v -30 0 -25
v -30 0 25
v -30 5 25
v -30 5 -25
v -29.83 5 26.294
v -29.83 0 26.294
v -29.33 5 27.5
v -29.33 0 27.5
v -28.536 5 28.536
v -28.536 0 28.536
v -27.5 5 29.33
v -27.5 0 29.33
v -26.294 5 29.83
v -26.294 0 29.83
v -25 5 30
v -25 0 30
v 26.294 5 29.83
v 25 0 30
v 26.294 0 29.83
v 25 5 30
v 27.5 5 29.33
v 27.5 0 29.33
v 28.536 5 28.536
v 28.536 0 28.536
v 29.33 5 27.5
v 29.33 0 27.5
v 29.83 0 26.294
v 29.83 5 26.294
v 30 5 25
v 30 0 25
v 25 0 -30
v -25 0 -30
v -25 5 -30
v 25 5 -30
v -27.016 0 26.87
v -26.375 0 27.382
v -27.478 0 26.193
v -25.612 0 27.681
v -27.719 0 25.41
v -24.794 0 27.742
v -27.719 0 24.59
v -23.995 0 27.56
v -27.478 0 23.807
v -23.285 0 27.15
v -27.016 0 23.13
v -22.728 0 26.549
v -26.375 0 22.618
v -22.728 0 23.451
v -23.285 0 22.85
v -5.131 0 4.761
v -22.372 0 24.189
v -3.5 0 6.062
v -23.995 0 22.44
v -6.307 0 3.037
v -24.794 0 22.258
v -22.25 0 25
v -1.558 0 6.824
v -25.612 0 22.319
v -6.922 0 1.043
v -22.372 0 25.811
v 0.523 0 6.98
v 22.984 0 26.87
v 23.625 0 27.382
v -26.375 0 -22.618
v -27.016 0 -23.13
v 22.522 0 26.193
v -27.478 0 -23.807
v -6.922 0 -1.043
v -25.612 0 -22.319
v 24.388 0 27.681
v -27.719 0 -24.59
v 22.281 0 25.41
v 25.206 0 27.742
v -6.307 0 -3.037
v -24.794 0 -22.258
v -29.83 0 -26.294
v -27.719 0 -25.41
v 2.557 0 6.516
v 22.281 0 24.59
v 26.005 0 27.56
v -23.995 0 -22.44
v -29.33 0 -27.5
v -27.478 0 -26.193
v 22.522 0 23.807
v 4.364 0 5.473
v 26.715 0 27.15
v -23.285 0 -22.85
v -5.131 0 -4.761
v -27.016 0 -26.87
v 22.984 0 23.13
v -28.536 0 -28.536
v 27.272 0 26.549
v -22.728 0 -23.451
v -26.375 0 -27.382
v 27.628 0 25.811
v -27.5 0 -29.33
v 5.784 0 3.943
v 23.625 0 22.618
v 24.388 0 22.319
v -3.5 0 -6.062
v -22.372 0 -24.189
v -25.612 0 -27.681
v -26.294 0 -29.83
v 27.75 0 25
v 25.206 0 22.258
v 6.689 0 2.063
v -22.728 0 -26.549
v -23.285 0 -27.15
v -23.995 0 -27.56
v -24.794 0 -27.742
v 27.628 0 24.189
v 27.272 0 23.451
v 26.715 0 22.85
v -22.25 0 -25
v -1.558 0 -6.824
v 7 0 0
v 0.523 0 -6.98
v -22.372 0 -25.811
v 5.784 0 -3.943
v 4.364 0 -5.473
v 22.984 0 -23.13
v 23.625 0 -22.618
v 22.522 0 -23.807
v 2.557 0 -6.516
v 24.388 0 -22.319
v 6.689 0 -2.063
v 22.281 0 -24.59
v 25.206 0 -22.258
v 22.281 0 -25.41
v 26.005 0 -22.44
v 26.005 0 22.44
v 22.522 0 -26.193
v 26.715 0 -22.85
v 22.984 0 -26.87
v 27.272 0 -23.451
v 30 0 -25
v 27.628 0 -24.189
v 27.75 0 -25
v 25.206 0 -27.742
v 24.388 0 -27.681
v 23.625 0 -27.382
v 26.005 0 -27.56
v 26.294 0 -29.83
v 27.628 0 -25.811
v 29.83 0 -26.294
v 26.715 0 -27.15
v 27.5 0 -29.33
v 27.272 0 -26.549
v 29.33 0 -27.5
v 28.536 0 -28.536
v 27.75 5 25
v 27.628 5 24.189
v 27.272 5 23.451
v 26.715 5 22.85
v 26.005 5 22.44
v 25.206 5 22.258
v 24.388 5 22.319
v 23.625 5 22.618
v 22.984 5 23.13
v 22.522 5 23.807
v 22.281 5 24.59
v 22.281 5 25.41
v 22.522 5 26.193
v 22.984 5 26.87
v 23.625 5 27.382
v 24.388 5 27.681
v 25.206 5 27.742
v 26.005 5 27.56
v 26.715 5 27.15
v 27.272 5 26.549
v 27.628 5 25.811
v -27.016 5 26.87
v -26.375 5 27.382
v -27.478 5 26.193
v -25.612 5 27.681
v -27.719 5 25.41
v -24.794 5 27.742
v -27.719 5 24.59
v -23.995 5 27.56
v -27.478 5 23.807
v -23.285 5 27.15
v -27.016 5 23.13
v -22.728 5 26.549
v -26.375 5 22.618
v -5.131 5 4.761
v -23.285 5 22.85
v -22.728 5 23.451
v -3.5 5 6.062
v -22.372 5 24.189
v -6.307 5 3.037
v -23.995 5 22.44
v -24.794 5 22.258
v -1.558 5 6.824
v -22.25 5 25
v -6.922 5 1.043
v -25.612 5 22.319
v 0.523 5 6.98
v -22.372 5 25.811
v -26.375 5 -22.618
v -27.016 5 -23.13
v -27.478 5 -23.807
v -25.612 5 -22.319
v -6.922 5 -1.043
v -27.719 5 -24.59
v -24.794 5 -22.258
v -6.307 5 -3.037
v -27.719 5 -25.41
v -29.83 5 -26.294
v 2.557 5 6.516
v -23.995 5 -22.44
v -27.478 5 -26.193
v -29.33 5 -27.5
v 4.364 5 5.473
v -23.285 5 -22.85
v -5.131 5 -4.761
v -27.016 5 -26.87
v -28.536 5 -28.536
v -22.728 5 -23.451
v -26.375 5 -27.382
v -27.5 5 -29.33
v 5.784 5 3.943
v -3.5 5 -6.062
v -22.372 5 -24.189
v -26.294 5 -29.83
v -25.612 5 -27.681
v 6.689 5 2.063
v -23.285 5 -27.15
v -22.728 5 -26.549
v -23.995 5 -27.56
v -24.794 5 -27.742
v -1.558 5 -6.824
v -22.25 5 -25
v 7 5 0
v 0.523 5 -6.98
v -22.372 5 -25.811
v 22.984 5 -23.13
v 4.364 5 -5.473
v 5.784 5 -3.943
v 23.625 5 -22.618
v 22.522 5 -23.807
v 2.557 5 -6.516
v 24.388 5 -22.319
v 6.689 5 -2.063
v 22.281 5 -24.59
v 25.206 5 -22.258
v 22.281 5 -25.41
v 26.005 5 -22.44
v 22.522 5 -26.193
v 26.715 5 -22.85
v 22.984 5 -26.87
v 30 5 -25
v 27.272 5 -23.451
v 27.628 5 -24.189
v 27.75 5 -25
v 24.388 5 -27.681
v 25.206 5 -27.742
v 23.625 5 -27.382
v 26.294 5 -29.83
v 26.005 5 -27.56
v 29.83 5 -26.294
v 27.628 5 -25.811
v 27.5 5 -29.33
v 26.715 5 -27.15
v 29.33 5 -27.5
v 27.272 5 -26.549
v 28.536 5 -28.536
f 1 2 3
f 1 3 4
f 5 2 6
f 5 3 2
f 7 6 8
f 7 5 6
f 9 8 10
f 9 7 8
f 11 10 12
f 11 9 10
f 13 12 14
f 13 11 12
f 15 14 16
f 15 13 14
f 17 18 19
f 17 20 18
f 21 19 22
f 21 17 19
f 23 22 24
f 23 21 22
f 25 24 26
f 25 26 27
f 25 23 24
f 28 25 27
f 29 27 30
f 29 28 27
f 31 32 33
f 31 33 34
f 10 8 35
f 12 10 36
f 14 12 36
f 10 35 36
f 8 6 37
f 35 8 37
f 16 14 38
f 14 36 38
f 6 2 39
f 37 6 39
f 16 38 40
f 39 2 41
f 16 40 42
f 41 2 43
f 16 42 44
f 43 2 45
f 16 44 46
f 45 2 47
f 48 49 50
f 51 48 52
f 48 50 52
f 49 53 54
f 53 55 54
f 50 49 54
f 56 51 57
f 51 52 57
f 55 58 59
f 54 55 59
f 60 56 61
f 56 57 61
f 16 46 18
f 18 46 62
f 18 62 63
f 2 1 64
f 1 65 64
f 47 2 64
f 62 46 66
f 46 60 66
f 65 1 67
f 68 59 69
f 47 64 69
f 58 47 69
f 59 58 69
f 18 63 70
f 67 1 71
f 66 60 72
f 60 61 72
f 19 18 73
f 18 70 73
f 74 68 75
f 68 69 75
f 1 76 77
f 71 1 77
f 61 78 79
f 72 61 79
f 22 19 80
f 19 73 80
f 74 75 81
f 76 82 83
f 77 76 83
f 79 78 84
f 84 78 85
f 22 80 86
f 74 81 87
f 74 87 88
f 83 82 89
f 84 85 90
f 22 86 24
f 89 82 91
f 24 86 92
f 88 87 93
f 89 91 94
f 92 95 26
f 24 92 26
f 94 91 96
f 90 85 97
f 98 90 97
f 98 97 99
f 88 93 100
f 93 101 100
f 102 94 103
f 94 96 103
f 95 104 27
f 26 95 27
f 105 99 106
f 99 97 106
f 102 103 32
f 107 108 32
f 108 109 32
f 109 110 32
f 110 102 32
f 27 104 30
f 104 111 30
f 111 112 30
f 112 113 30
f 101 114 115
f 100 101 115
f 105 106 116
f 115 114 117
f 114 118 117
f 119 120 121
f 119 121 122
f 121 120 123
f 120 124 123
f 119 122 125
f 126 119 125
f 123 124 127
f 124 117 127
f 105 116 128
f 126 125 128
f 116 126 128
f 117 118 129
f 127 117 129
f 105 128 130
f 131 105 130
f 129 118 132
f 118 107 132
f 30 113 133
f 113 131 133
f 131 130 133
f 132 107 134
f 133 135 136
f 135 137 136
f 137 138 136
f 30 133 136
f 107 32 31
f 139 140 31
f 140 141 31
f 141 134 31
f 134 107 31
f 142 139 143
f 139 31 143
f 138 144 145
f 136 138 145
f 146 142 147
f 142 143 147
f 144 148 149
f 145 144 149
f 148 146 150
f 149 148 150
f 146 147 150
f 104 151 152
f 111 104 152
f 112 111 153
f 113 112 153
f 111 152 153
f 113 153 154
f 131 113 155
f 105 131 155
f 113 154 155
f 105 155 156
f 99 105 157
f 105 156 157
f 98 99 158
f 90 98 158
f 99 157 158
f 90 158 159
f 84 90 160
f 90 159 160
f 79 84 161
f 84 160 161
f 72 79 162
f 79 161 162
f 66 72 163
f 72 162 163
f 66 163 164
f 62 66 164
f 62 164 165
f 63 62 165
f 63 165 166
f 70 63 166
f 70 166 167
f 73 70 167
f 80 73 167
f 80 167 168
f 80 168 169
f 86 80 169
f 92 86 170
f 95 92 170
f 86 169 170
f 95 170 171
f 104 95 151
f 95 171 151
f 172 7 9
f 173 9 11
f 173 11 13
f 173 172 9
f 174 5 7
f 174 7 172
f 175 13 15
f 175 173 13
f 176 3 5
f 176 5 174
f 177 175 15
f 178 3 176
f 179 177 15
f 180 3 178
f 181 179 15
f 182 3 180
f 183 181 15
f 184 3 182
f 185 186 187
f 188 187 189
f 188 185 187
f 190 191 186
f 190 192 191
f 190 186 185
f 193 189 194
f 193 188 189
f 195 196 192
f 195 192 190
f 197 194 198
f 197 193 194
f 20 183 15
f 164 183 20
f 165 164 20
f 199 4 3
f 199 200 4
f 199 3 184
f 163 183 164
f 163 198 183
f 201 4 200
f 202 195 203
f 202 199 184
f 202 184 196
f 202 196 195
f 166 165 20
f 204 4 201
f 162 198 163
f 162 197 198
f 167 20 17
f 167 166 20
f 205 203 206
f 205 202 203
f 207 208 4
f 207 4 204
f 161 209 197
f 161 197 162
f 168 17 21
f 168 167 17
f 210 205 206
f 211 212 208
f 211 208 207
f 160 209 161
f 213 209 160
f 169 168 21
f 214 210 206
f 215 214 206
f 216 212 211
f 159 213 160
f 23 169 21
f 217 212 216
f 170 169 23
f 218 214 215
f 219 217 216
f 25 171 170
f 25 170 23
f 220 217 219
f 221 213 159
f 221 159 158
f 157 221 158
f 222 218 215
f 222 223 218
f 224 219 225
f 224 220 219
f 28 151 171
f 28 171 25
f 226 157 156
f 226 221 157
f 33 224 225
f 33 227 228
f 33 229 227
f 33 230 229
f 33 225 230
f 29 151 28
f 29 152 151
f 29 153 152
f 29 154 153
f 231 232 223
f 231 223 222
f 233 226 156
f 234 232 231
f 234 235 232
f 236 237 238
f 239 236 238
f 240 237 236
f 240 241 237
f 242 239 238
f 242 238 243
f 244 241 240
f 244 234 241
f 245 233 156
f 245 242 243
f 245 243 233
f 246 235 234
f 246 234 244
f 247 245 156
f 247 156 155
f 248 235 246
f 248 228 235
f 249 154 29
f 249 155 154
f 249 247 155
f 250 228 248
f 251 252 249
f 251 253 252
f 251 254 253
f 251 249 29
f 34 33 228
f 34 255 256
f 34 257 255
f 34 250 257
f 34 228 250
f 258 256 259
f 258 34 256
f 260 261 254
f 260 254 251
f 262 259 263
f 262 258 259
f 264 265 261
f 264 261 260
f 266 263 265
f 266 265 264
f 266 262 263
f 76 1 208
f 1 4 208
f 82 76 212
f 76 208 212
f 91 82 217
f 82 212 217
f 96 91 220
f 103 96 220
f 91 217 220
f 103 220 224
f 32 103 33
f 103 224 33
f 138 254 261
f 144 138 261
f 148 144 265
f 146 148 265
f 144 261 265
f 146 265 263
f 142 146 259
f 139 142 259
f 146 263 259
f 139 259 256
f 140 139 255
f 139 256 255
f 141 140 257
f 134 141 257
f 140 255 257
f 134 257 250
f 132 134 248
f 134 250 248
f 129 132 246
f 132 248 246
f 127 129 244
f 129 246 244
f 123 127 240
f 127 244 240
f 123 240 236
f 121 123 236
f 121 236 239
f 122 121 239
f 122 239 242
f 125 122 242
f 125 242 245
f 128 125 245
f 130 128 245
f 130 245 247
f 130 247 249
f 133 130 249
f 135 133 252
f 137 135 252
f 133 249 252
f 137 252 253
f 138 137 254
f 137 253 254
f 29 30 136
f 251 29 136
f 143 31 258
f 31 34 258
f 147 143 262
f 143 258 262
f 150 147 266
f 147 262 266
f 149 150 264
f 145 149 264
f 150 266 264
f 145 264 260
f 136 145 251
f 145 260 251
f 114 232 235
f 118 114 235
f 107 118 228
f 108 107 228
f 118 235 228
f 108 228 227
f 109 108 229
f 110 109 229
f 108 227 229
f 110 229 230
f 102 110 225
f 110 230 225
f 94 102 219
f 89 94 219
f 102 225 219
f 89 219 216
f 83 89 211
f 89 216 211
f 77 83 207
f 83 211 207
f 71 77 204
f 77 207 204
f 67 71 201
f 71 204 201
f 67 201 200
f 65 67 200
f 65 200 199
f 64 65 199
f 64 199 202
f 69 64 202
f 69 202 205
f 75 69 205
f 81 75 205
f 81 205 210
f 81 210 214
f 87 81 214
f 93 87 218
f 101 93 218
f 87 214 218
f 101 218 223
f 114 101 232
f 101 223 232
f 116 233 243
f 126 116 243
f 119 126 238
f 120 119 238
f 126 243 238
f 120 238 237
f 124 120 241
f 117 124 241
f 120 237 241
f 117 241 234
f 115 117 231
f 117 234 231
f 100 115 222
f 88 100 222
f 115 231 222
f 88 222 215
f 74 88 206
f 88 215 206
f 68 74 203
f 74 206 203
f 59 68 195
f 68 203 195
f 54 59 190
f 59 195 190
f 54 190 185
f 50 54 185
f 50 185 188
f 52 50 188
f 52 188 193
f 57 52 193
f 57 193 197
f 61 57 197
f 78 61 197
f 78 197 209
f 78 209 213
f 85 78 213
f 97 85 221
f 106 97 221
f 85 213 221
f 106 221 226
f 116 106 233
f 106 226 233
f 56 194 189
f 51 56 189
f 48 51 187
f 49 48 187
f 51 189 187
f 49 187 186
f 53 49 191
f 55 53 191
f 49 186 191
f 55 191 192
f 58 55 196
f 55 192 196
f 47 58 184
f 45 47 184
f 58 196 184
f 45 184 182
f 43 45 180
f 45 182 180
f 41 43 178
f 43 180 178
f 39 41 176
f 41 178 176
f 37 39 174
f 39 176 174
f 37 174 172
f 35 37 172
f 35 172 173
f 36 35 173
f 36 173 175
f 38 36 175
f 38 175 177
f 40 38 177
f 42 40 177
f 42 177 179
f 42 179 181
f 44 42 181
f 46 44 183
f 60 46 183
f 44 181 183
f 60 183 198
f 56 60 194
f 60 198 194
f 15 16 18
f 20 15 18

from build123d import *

# Parameters (mm, degrees)
SKETCH1_W           = 60
SKETCH1_H           = 60
BOSS_EXTRUDE1_DEPTH = 5
SKETCH2_R           = 2.75
CUT_EXTRUDE1_DEPTH  = 5
FILLET2_R           = 5
SKETCH3_R           = 7
CUT_EXTRUDE2_DEPTH  = 5


with BuildPart() as part:
    # Sketch1 → Boss-Extrude1 (new body)
    with BuildSketch(Plane(origin=(0, 0, 0), x_dir=(1, 0, 0), z_dir=(0, 1, 0))):
        Rectangle(SKETCH1_W, SKETCH1_H)
    extrude(amount=BOSS_EXTRUDE1_DEPTH)

    # Sketch2 → Cut-Extrude1 (cut)
    with BuildSketch(Plane(origin=(0, 5, 0), x_dir=(1, 0, 0), z_dir=(0, 1, 0))):
        with Locations((25, 25)):
            Circle(SKETCH2_R)
        with Locations((-25, 25)):
            Circle(SKETCH2_R)
        with Locations((-25, -25)):
            Circle(SKETCH2_R)
        with Locations((25, -25)):
            Circle(SKETCH2_R)
    extrude(amount=-CUT_EXTRUDE1_DEPTH, mode=Mode.SUBTRACT)

    # Fillet2
    fillet2_edges = [part.edges().sort_by_distance(p)[0] for p in [
        (-30, 2.5, -30),
        (30, 2.5, -30),
        (30, 2.5, 30),
        (-30, 2.5, 30),
    ]]
    fillet(fillet2_edges, radius=FILLET2_R)

    # Sketch3 → Cut-Extrude2 (cut)
    with BuildSketch(Plane(origin=(0, 5, 0), x_dir=(1, 0, 0), z_dir=(0, 1, 0))):
        Circle(SKETCH3_R)
    extrude(amount=-CUT_EXTRUDE2_DEPTH, mode=Mode.SUBTRACT)


solid = part.part
